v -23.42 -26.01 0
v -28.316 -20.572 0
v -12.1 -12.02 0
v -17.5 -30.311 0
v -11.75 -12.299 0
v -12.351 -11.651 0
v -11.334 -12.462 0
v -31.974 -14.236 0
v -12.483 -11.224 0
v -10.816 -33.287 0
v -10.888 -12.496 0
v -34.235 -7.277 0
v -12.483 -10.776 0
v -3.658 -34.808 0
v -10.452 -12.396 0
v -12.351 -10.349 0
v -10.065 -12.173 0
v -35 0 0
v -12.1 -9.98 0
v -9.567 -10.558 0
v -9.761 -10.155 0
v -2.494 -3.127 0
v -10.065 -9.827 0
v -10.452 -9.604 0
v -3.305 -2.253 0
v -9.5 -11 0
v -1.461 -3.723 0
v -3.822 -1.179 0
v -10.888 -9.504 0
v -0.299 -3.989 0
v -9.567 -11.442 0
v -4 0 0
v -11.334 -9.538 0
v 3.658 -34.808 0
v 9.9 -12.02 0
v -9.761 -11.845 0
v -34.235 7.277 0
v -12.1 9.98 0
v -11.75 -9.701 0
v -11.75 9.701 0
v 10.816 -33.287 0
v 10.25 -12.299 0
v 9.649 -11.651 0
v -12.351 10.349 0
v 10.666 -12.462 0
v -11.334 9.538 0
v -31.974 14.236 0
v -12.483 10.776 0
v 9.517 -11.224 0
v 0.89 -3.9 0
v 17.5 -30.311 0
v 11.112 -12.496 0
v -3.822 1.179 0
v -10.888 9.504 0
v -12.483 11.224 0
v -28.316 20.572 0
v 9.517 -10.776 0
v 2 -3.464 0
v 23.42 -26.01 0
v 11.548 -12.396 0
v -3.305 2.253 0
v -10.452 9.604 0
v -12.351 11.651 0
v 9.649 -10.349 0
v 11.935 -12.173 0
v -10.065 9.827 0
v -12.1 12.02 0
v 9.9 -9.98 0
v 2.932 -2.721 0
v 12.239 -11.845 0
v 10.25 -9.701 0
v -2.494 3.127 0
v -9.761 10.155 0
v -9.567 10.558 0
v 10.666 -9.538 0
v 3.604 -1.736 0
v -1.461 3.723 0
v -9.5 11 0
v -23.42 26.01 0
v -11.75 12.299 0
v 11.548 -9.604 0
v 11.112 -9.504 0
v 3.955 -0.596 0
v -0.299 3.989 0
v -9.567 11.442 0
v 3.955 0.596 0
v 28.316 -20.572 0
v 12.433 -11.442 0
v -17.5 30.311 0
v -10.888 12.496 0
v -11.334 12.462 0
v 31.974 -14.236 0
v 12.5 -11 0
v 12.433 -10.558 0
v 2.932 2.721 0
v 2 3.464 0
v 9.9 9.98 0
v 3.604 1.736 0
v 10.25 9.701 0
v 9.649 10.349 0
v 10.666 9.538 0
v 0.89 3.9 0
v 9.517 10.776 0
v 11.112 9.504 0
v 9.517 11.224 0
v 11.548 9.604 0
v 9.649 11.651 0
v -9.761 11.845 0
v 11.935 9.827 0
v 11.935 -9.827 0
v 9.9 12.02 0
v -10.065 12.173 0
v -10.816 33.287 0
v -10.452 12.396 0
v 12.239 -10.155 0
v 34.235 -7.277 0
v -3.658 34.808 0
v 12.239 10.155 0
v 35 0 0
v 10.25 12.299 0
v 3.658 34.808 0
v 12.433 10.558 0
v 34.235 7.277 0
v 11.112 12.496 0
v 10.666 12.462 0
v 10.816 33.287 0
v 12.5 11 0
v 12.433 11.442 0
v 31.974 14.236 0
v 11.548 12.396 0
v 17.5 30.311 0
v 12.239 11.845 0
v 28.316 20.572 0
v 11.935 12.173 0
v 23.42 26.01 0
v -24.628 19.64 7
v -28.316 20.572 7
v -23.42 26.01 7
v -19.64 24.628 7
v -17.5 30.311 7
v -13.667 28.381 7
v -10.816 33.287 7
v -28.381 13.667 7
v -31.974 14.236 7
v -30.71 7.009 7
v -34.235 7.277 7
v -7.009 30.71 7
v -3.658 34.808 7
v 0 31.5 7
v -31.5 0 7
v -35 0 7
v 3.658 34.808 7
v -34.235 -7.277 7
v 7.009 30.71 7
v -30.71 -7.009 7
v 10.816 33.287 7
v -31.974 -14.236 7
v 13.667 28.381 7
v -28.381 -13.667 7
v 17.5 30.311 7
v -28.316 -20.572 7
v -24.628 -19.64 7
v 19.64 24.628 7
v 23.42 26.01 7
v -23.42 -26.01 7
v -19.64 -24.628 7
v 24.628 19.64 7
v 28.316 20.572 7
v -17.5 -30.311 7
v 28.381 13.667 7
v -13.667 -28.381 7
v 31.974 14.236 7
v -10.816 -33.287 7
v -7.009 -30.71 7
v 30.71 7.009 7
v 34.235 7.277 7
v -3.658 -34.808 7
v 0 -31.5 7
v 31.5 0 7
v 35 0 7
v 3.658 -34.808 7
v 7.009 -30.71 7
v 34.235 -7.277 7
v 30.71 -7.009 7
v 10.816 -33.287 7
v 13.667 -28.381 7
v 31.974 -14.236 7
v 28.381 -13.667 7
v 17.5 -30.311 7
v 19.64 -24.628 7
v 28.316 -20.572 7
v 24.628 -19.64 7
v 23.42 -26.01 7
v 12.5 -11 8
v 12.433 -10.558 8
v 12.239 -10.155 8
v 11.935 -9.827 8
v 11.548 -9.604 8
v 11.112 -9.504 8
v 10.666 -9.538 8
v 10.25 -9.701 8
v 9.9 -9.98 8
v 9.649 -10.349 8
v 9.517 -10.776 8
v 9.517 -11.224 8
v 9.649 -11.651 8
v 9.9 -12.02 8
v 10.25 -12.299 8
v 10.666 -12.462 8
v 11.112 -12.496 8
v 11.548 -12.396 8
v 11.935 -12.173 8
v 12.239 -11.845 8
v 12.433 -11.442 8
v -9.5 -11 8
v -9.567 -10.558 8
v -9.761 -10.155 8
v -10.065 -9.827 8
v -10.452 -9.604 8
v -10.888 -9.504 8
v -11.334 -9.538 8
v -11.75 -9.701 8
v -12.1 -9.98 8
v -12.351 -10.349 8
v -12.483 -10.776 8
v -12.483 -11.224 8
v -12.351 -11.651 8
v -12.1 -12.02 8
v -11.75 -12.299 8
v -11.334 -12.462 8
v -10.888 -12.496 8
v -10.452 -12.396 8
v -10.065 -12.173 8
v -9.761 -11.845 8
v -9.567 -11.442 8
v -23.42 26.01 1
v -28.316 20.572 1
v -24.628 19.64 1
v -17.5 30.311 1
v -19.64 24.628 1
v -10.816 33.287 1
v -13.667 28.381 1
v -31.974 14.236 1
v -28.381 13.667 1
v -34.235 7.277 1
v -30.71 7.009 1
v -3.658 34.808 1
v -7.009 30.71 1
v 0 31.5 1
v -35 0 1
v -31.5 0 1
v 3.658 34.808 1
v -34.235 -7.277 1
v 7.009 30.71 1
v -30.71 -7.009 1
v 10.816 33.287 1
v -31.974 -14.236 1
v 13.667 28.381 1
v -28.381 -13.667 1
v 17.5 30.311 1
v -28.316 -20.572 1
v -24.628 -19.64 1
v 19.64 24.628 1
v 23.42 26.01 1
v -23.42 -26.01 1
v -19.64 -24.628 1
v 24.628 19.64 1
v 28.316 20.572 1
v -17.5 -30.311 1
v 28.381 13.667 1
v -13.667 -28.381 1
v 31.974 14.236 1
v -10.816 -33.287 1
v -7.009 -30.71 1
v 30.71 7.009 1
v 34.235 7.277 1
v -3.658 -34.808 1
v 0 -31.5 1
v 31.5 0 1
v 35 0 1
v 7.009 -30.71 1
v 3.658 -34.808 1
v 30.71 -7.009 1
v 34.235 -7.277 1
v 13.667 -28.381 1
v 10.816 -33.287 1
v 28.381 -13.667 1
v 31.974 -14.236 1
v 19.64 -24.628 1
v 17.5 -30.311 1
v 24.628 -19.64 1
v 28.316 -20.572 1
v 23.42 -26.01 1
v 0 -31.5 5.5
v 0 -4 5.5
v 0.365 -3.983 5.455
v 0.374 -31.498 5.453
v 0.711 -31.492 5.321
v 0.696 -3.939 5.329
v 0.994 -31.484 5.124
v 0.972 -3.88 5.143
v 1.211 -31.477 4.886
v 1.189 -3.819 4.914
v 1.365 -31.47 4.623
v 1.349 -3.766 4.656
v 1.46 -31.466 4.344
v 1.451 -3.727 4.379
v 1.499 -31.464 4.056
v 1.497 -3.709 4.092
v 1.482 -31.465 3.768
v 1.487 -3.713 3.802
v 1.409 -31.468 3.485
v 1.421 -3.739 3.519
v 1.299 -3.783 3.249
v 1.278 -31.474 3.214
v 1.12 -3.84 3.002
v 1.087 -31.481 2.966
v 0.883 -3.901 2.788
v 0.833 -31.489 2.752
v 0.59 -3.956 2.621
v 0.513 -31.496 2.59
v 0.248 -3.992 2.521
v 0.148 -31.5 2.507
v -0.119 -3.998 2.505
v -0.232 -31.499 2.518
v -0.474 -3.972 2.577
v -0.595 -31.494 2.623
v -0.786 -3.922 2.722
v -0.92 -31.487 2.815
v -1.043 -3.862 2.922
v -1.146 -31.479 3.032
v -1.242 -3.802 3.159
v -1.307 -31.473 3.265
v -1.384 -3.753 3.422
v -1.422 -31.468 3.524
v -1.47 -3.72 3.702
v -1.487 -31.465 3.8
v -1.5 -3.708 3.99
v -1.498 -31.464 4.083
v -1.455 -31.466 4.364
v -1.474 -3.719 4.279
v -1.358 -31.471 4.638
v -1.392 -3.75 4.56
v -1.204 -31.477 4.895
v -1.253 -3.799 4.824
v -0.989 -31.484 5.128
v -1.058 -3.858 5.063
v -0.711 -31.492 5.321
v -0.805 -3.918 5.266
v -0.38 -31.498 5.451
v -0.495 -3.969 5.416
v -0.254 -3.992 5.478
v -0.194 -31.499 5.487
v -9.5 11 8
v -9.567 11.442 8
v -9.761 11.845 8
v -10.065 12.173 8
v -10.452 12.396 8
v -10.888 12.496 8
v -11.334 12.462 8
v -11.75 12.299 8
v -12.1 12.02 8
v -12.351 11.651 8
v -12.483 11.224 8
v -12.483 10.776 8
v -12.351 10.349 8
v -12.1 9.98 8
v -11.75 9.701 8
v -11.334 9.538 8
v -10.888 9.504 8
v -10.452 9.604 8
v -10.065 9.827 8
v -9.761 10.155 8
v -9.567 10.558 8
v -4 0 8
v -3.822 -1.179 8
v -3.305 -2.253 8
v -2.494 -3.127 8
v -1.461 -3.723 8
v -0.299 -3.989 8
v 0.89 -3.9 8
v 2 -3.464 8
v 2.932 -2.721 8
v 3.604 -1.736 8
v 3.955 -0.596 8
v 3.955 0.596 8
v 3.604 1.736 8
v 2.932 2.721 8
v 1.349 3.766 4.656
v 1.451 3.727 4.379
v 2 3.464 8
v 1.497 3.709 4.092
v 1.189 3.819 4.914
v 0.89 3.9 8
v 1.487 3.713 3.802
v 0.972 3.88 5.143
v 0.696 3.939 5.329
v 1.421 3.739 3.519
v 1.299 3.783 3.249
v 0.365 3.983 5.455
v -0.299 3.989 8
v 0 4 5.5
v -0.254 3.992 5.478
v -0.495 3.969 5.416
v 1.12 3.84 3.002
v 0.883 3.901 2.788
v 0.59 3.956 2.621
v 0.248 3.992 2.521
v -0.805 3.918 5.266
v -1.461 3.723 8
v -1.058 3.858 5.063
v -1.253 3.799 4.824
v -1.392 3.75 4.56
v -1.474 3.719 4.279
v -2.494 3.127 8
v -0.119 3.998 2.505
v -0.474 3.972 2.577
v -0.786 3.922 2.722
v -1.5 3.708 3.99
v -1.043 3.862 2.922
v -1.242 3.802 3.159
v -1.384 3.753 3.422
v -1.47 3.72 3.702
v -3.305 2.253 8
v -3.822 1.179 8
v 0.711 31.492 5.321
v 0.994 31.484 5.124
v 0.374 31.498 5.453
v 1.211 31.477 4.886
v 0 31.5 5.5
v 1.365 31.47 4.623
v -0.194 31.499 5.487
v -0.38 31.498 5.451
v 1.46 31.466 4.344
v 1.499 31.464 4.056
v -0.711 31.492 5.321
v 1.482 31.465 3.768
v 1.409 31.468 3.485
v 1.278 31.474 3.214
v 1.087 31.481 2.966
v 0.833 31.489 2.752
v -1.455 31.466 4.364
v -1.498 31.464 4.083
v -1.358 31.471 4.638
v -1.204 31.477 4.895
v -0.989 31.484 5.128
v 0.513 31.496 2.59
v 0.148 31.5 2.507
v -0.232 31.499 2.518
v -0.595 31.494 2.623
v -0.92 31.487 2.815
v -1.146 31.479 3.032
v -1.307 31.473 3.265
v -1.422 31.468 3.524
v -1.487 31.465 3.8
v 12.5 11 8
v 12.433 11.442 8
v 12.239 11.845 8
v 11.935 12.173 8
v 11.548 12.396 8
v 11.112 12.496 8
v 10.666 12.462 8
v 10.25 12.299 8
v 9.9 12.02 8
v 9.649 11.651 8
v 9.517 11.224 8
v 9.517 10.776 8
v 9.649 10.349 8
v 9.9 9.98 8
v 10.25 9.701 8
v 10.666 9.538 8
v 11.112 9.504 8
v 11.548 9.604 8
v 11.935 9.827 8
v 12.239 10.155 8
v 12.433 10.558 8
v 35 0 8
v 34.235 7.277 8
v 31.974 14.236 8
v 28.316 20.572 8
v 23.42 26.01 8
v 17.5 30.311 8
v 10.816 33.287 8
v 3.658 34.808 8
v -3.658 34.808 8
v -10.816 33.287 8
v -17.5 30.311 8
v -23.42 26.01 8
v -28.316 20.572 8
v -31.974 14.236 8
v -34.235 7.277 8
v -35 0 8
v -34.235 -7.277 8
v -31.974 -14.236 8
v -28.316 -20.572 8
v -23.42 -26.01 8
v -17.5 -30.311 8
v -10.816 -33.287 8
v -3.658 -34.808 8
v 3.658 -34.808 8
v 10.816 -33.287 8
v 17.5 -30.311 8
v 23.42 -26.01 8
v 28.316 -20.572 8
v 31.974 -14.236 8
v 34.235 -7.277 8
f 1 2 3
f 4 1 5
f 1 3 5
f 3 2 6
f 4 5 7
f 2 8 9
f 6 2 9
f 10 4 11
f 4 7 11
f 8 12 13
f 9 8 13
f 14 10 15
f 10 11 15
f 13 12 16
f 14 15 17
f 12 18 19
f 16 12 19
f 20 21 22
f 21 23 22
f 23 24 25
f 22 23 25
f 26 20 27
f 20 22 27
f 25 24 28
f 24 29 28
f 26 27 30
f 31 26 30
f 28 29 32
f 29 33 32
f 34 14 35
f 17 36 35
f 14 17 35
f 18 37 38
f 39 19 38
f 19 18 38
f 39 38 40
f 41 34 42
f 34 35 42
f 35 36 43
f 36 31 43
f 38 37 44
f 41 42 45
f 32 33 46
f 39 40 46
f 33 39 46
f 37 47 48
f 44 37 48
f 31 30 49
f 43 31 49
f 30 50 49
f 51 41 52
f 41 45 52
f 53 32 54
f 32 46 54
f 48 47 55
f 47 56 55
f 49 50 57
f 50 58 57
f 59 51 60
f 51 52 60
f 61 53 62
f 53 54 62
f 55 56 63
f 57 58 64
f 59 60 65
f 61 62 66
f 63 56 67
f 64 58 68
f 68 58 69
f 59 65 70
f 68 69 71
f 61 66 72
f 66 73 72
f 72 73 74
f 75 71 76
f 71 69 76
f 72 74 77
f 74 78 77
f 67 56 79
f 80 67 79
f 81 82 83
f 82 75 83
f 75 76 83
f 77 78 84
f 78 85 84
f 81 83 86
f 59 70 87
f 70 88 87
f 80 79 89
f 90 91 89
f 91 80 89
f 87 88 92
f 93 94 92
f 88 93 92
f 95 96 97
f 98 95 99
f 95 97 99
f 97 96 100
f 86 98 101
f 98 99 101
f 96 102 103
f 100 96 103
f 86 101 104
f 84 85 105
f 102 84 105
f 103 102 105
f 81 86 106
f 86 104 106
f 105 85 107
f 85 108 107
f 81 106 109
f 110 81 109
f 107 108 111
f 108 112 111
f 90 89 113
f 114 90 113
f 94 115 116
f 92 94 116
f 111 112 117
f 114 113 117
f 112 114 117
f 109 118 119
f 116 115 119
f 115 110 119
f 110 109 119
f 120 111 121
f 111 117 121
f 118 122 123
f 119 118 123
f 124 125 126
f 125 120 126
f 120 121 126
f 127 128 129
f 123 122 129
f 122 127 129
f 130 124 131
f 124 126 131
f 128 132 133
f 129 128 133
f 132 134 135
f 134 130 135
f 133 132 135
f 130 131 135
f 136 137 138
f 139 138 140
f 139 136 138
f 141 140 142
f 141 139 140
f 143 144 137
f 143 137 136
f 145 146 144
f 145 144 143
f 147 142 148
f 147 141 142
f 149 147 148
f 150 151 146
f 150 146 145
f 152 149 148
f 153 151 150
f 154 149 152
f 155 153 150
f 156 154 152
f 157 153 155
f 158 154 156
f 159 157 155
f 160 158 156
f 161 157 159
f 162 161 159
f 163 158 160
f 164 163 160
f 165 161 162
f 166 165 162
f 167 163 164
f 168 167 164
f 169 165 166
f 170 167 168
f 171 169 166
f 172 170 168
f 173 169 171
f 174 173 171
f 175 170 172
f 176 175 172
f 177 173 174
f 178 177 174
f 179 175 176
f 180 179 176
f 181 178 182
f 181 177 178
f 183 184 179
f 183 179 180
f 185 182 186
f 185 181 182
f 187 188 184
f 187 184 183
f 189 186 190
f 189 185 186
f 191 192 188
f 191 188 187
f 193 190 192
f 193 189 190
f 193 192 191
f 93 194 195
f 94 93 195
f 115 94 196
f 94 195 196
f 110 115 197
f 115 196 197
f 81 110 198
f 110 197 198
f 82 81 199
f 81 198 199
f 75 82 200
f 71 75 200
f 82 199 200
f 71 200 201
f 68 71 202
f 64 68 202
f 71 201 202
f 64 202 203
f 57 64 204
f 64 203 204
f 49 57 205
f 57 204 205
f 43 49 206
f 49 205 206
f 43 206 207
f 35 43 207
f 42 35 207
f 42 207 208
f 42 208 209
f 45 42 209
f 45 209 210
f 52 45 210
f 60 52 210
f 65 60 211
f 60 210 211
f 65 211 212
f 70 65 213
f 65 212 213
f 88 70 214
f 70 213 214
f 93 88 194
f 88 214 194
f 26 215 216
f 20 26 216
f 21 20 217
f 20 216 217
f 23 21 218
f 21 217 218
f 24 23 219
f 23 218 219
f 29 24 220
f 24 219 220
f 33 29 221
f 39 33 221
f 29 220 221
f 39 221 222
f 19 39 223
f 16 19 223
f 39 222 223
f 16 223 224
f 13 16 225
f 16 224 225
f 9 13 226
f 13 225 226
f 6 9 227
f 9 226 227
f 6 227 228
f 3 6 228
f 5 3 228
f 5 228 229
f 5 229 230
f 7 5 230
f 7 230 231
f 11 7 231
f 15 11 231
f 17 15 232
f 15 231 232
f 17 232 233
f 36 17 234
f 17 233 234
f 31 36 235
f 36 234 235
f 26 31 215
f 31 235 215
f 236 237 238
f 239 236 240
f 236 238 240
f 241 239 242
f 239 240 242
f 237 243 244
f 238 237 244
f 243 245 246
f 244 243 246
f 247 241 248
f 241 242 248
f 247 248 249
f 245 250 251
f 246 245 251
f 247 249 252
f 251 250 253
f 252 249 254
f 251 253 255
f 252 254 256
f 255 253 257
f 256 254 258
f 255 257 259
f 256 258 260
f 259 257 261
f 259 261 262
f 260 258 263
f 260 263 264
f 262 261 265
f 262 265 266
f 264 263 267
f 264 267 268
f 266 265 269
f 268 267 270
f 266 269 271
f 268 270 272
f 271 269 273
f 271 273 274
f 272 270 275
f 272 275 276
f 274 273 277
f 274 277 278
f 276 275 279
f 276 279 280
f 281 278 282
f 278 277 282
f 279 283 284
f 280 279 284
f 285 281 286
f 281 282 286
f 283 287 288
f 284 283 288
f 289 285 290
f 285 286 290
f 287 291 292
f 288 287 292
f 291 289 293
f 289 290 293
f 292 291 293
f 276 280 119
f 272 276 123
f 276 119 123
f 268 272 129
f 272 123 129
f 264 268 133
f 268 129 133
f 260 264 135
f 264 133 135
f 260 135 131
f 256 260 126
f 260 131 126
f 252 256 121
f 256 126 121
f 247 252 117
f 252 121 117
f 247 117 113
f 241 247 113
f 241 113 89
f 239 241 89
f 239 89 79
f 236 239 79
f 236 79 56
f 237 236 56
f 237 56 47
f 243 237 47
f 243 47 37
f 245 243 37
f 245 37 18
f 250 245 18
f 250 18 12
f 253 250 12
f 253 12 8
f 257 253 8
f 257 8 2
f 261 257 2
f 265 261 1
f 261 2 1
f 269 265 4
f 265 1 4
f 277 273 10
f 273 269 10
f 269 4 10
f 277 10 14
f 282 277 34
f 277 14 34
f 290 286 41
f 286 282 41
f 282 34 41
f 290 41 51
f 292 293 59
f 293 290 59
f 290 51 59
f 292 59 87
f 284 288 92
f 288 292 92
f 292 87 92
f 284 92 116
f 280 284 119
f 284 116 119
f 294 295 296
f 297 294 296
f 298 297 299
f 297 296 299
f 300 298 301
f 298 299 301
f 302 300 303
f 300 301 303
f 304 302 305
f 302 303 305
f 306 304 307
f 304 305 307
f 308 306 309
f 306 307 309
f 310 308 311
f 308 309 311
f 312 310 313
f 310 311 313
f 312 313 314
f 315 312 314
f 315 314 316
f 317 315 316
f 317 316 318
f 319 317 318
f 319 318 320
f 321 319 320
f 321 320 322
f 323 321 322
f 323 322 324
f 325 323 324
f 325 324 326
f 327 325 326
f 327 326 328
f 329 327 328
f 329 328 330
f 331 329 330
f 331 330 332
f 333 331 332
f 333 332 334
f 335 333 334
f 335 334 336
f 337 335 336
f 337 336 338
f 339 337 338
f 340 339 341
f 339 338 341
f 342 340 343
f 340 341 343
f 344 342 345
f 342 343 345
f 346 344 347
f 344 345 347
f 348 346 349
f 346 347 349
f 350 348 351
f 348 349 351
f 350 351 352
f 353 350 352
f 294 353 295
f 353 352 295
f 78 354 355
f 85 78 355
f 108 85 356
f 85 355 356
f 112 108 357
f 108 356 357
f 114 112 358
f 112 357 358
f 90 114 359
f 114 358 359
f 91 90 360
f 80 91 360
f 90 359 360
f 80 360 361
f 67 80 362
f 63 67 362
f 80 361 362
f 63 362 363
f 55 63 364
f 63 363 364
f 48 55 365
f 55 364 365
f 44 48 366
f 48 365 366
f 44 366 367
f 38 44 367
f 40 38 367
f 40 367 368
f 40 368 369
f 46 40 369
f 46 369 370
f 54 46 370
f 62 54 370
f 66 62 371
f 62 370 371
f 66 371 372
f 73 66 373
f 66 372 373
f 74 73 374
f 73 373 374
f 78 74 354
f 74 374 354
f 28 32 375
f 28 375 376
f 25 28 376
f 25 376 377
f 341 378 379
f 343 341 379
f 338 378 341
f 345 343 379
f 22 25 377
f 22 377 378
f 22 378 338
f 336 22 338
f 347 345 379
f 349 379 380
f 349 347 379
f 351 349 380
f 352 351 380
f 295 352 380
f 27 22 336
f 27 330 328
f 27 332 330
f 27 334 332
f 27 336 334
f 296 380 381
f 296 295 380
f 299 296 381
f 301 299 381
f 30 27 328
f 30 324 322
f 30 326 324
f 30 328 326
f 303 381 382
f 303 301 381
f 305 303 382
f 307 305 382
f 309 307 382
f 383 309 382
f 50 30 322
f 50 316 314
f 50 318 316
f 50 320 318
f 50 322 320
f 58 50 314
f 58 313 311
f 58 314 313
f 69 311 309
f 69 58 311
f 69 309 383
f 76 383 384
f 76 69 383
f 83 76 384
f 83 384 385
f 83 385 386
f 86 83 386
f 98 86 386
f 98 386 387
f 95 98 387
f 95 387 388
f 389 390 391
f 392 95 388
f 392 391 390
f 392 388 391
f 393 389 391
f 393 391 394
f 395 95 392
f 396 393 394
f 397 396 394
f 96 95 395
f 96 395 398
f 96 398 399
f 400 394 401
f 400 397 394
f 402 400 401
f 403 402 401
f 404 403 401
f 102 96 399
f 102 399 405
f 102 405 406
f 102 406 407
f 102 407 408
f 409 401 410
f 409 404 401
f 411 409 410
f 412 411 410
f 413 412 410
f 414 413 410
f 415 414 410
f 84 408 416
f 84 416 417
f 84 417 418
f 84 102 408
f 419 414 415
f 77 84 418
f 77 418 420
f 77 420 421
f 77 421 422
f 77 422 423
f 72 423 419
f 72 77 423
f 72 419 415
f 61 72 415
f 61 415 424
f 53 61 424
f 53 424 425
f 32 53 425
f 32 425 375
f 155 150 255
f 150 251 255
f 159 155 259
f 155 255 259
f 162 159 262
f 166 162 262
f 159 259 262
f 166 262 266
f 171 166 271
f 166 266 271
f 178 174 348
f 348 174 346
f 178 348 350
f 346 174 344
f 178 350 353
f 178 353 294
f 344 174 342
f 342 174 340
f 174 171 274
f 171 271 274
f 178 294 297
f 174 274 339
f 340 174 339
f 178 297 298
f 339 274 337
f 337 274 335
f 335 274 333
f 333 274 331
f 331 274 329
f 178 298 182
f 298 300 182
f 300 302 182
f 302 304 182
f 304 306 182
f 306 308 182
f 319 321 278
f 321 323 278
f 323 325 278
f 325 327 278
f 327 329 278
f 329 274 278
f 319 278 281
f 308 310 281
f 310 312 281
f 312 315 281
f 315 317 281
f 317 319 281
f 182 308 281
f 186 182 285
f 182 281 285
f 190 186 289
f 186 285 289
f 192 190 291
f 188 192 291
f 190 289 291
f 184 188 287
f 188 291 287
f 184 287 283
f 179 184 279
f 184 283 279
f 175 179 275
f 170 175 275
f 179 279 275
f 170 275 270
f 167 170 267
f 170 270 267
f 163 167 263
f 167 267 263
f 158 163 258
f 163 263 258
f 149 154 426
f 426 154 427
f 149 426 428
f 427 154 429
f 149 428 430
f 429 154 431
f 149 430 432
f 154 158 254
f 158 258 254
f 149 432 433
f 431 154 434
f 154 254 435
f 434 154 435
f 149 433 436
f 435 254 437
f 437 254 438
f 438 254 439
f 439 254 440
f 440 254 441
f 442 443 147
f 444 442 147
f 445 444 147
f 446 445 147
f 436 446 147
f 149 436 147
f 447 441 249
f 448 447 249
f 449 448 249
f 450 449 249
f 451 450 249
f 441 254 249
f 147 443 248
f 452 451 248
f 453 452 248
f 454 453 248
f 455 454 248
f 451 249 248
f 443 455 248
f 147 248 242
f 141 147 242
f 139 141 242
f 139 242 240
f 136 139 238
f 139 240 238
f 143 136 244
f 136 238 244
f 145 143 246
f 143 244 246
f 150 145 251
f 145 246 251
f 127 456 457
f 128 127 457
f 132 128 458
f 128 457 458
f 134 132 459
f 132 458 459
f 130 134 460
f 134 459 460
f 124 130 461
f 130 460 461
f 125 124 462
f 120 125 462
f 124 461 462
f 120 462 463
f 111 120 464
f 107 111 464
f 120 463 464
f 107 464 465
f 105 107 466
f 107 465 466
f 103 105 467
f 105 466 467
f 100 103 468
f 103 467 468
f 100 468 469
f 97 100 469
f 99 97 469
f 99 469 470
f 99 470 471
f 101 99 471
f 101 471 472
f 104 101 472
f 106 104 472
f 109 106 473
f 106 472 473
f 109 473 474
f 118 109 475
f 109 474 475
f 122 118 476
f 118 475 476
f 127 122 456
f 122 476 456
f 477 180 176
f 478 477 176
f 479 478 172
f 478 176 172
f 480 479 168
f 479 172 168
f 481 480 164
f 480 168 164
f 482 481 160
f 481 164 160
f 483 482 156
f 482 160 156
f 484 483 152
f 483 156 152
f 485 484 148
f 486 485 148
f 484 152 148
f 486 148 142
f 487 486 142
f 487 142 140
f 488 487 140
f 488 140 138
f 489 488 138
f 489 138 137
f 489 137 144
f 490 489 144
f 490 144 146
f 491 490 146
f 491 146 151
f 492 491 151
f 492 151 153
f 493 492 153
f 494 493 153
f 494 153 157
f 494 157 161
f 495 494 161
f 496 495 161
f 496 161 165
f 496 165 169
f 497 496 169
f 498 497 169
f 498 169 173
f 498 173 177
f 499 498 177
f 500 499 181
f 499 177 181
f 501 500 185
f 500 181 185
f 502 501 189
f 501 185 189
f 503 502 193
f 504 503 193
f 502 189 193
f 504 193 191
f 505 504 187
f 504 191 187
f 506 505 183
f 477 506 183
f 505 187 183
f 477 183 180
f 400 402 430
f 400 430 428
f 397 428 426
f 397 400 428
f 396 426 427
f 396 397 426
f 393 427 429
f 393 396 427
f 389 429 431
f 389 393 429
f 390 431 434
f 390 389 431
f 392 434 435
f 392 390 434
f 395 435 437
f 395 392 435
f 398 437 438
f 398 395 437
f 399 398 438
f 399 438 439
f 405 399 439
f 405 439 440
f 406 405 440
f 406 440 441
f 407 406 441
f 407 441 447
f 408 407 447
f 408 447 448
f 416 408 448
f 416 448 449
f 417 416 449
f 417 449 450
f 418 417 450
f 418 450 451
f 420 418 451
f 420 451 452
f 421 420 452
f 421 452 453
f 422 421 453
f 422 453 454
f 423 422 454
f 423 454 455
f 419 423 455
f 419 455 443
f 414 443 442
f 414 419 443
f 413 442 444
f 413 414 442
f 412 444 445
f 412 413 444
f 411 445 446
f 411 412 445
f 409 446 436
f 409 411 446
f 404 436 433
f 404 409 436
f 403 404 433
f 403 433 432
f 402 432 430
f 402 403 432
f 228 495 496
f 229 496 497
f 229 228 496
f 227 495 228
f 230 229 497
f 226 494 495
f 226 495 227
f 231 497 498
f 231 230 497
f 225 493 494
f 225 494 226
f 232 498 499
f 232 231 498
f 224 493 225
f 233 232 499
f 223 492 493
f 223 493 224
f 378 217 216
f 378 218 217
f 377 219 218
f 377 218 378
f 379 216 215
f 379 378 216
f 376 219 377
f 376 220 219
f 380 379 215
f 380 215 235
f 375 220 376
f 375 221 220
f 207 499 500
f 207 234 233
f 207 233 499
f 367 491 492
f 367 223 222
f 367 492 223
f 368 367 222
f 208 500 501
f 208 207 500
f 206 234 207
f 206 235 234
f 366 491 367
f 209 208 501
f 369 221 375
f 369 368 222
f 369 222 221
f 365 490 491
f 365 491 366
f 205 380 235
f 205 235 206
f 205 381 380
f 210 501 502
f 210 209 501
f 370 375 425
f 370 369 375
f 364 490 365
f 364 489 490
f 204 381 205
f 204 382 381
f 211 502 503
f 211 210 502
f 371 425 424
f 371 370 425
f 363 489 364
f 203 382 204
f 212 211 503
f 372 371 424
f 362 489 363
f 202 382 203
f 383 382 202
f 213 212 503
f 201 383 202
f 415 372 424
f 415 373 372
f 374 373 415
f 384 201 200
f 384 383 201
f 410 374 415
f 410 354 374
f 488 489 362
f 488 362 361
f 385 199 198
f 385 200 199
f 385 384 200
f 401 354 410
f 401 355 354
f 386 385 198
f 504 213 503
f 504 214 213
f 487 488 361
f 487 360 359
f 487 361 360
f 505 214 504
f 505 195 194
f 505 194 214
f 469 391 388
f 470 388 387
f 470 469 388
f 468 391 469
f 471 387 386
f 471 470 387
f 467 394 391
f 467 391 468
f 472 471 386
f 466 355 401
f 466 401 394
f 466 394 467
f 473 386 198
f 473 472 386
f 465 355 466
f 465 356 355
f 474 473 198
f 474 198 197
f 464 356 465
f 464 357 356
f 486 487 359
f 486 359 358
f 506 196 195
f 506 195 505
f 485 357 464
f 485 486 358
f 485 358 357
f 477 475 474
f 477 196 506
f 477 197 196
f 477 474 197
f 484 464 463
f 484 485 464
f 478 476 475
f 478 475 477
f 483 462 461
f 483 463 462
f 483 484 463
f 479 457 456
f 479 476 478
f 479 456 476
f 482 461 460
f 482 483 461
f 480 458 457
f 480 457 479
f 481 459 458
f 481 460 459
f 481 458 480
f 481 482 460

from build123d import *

# Parameters (mm, degrees)
SKETCH1_R                                       = 35
PULLEY_BOSS_EXTRUDE1_DEPTH                      = 8
SKETCH2_W                                       = 3.5
SKETCH2_H                                       = 6
SKETCH3_R                                       = 4
SHAFT_CUT_EXTRUDE1_DEPTH                        = 8
SPRINT_HOLE_CUT_EXTRUDE2_REACH                  = 52.14
SPRINT_HOLE_CUT_EXTRUDE2_END_RADIUS             = 31.5
SKETCH4_R                                       = 1.5
SPRINT_HOLE_CUT_EXTRUDE2_DIRECTION_2_REACH      = 52.14
SPRINT_HOLE_CUT_EXTRUDE2_DIRECTION_2_END_RADIUS = 31.5
SKETCH5_R                                       = 1.5
ARM_DISTANS_MOUNTING_HOLES_CUT_EXTRUDE1_DEPTH   = 8


with BuildPart() as part:
    # Sketch1 → Pulley Boss-Extrude1 (new body)
    with BuildSketch(Plane.XY):
        Circle(SKETCH1_R)
    extrude(amount=PULLEY_BOSS_EXTRUDE1_DEPTH)

    # Sketch2 → Belt Cut-Revolve3 (revolve, cut)
    with BuildSketch(Plane(origin=(0, 0, 0), x_dir=(1, 0, 0), z_dir=(0, 1, 0)), mode=Mode.PRIVATE) as belt_cut_revolve3_sk:
        with Locations((33.25, -4)):
            Rectangle(SKETCH2_W, SKETCH2_H)
    revolve(belt_cut_revolve3_sk.sketch.rotate(Axis((0, 0, -14.62158436), (0, 0, 1)), 180), axis=Axis((0, 0, -14.62158436), (0, 0, 1)), mode=Mode.SUBTRACT)

    # Sketch3 → Shaft Cut-Extrude1 (cut)
    with BuildSketch(Plane.XY):
        with Locations(Location((0, 0, 0), (0, 0, 180))):
            Circle(SKETCH3_R)
    extrude(amount=SHAFT_CUT_EXTRUDE1_DEPTH, mode=Mode.SUBTRACT)

    # Sprint Hole Cut-Extrude2: up to this cylinder (the profile starts inside it)
    sprint_hole_cut_extrude2_end = Plane(origin=(0, 0, 4), z_dir=(0, 0, -1)) * Cylinder(SPRINT_HOLE_CUT_EXTRUDE2_END_RADIUS, 168.28, mode=Mode.PRIVATE)
    # Sketch4 → Sprint Hole Cut-Extrude2 (cut, up to the surface)
    with BuildSketch(Plane(origin=(0, 0, 0), x_dir=(1, 0, 0), z_dir=(0, 1, 0)), mode=Mode.PRIVATE) as sprint_hole_cut_extrude2_sk1:
        with Locations(Location((0, -4, 0), (0, 0, 270))):
            Circle(SKETCH4_R)
    sprint_hole_cut_extrude2_tool1 = extrude(sprint_hole_cut_extrude2_sk1.sketch, amount=-SPRINT_HOLE_CUT_EXTRUDE2_REACH, mode=Mode.PRIVATE) & sprint_hole_cut_extrude2_end
    add(sprint_hole_cut_extrude2_tool1.solids().sort_by_distance((0, 0, 4))[0], mode=Mode.SUBTRACT)

    # Sprint Hole Cut-Extrude2 direction 2: up to this cylinder (the profile starts inside it)
    sprint_hole_cut_extrude2_direction_2_end = Plane(origin=(0, 0, 4), z_dir=(0, 0, -1)) * Cylinder(SPRINT_HOLE_CUT_EXTRUDE2_DIRECTION_2_END_RADIUS, 168.28, mode=Mode.PRIVATE)
    # Sketch4 → Sprint Hole Cut-Extrude2 direction 2 (cut, up to the surface)
    with BuildSketch(Plane(origin=(0, 0, 0), x_dir=(1, 0, 0), z_dir=(0, 1, 0)), mode=Mode.PRIVATE) as sprint_hole_cut_extrude2_direction_2_sk1:
        with Locations(Location((0, -4, 0), (0, 0, 270))):
            Circle(SKETCH4_R)
    sprint_hole_cut_extrude2_direction_2_tool1 = extrude(sprint_hole_cut_extrude2_direction_2_sk1.sketch, amount=SPRINT_HOLE_CUT_EXTRUDE2_DIRECTION_2_REACH, mode=Mode.PRIVATE) & sprint_hole_cut_extrude2_direction_2_end
    add(sprint_hole_cut_extrude2_direction_2_tool1.solids().sort_by_distance((0, 0, 4))[0], mode=Mode.SUBTRACT)

    # Sketch5 → Arm Distans Mounting Holes Cut-Extrude1 (cut)
    with BuildSketch(Plane.XY.offset(8)):
        with Locations((11, 11)):
            Circle(SKETCH5_R)
        with Locations((-11, 11)):
            Circle(SKETCH5_R)
        with Locations((-11, -11)):
            Circle(SKETCH5_R)
        with Locations((11, -11)):
            Circle(SKETCH5_R)
    extrude(amount=-ARM_DISTANS_MOUNTING_HOLES_CUT_EXTRUDE1_DEPTH, mode=Mode.SUBTRACT)


solid = part.part
